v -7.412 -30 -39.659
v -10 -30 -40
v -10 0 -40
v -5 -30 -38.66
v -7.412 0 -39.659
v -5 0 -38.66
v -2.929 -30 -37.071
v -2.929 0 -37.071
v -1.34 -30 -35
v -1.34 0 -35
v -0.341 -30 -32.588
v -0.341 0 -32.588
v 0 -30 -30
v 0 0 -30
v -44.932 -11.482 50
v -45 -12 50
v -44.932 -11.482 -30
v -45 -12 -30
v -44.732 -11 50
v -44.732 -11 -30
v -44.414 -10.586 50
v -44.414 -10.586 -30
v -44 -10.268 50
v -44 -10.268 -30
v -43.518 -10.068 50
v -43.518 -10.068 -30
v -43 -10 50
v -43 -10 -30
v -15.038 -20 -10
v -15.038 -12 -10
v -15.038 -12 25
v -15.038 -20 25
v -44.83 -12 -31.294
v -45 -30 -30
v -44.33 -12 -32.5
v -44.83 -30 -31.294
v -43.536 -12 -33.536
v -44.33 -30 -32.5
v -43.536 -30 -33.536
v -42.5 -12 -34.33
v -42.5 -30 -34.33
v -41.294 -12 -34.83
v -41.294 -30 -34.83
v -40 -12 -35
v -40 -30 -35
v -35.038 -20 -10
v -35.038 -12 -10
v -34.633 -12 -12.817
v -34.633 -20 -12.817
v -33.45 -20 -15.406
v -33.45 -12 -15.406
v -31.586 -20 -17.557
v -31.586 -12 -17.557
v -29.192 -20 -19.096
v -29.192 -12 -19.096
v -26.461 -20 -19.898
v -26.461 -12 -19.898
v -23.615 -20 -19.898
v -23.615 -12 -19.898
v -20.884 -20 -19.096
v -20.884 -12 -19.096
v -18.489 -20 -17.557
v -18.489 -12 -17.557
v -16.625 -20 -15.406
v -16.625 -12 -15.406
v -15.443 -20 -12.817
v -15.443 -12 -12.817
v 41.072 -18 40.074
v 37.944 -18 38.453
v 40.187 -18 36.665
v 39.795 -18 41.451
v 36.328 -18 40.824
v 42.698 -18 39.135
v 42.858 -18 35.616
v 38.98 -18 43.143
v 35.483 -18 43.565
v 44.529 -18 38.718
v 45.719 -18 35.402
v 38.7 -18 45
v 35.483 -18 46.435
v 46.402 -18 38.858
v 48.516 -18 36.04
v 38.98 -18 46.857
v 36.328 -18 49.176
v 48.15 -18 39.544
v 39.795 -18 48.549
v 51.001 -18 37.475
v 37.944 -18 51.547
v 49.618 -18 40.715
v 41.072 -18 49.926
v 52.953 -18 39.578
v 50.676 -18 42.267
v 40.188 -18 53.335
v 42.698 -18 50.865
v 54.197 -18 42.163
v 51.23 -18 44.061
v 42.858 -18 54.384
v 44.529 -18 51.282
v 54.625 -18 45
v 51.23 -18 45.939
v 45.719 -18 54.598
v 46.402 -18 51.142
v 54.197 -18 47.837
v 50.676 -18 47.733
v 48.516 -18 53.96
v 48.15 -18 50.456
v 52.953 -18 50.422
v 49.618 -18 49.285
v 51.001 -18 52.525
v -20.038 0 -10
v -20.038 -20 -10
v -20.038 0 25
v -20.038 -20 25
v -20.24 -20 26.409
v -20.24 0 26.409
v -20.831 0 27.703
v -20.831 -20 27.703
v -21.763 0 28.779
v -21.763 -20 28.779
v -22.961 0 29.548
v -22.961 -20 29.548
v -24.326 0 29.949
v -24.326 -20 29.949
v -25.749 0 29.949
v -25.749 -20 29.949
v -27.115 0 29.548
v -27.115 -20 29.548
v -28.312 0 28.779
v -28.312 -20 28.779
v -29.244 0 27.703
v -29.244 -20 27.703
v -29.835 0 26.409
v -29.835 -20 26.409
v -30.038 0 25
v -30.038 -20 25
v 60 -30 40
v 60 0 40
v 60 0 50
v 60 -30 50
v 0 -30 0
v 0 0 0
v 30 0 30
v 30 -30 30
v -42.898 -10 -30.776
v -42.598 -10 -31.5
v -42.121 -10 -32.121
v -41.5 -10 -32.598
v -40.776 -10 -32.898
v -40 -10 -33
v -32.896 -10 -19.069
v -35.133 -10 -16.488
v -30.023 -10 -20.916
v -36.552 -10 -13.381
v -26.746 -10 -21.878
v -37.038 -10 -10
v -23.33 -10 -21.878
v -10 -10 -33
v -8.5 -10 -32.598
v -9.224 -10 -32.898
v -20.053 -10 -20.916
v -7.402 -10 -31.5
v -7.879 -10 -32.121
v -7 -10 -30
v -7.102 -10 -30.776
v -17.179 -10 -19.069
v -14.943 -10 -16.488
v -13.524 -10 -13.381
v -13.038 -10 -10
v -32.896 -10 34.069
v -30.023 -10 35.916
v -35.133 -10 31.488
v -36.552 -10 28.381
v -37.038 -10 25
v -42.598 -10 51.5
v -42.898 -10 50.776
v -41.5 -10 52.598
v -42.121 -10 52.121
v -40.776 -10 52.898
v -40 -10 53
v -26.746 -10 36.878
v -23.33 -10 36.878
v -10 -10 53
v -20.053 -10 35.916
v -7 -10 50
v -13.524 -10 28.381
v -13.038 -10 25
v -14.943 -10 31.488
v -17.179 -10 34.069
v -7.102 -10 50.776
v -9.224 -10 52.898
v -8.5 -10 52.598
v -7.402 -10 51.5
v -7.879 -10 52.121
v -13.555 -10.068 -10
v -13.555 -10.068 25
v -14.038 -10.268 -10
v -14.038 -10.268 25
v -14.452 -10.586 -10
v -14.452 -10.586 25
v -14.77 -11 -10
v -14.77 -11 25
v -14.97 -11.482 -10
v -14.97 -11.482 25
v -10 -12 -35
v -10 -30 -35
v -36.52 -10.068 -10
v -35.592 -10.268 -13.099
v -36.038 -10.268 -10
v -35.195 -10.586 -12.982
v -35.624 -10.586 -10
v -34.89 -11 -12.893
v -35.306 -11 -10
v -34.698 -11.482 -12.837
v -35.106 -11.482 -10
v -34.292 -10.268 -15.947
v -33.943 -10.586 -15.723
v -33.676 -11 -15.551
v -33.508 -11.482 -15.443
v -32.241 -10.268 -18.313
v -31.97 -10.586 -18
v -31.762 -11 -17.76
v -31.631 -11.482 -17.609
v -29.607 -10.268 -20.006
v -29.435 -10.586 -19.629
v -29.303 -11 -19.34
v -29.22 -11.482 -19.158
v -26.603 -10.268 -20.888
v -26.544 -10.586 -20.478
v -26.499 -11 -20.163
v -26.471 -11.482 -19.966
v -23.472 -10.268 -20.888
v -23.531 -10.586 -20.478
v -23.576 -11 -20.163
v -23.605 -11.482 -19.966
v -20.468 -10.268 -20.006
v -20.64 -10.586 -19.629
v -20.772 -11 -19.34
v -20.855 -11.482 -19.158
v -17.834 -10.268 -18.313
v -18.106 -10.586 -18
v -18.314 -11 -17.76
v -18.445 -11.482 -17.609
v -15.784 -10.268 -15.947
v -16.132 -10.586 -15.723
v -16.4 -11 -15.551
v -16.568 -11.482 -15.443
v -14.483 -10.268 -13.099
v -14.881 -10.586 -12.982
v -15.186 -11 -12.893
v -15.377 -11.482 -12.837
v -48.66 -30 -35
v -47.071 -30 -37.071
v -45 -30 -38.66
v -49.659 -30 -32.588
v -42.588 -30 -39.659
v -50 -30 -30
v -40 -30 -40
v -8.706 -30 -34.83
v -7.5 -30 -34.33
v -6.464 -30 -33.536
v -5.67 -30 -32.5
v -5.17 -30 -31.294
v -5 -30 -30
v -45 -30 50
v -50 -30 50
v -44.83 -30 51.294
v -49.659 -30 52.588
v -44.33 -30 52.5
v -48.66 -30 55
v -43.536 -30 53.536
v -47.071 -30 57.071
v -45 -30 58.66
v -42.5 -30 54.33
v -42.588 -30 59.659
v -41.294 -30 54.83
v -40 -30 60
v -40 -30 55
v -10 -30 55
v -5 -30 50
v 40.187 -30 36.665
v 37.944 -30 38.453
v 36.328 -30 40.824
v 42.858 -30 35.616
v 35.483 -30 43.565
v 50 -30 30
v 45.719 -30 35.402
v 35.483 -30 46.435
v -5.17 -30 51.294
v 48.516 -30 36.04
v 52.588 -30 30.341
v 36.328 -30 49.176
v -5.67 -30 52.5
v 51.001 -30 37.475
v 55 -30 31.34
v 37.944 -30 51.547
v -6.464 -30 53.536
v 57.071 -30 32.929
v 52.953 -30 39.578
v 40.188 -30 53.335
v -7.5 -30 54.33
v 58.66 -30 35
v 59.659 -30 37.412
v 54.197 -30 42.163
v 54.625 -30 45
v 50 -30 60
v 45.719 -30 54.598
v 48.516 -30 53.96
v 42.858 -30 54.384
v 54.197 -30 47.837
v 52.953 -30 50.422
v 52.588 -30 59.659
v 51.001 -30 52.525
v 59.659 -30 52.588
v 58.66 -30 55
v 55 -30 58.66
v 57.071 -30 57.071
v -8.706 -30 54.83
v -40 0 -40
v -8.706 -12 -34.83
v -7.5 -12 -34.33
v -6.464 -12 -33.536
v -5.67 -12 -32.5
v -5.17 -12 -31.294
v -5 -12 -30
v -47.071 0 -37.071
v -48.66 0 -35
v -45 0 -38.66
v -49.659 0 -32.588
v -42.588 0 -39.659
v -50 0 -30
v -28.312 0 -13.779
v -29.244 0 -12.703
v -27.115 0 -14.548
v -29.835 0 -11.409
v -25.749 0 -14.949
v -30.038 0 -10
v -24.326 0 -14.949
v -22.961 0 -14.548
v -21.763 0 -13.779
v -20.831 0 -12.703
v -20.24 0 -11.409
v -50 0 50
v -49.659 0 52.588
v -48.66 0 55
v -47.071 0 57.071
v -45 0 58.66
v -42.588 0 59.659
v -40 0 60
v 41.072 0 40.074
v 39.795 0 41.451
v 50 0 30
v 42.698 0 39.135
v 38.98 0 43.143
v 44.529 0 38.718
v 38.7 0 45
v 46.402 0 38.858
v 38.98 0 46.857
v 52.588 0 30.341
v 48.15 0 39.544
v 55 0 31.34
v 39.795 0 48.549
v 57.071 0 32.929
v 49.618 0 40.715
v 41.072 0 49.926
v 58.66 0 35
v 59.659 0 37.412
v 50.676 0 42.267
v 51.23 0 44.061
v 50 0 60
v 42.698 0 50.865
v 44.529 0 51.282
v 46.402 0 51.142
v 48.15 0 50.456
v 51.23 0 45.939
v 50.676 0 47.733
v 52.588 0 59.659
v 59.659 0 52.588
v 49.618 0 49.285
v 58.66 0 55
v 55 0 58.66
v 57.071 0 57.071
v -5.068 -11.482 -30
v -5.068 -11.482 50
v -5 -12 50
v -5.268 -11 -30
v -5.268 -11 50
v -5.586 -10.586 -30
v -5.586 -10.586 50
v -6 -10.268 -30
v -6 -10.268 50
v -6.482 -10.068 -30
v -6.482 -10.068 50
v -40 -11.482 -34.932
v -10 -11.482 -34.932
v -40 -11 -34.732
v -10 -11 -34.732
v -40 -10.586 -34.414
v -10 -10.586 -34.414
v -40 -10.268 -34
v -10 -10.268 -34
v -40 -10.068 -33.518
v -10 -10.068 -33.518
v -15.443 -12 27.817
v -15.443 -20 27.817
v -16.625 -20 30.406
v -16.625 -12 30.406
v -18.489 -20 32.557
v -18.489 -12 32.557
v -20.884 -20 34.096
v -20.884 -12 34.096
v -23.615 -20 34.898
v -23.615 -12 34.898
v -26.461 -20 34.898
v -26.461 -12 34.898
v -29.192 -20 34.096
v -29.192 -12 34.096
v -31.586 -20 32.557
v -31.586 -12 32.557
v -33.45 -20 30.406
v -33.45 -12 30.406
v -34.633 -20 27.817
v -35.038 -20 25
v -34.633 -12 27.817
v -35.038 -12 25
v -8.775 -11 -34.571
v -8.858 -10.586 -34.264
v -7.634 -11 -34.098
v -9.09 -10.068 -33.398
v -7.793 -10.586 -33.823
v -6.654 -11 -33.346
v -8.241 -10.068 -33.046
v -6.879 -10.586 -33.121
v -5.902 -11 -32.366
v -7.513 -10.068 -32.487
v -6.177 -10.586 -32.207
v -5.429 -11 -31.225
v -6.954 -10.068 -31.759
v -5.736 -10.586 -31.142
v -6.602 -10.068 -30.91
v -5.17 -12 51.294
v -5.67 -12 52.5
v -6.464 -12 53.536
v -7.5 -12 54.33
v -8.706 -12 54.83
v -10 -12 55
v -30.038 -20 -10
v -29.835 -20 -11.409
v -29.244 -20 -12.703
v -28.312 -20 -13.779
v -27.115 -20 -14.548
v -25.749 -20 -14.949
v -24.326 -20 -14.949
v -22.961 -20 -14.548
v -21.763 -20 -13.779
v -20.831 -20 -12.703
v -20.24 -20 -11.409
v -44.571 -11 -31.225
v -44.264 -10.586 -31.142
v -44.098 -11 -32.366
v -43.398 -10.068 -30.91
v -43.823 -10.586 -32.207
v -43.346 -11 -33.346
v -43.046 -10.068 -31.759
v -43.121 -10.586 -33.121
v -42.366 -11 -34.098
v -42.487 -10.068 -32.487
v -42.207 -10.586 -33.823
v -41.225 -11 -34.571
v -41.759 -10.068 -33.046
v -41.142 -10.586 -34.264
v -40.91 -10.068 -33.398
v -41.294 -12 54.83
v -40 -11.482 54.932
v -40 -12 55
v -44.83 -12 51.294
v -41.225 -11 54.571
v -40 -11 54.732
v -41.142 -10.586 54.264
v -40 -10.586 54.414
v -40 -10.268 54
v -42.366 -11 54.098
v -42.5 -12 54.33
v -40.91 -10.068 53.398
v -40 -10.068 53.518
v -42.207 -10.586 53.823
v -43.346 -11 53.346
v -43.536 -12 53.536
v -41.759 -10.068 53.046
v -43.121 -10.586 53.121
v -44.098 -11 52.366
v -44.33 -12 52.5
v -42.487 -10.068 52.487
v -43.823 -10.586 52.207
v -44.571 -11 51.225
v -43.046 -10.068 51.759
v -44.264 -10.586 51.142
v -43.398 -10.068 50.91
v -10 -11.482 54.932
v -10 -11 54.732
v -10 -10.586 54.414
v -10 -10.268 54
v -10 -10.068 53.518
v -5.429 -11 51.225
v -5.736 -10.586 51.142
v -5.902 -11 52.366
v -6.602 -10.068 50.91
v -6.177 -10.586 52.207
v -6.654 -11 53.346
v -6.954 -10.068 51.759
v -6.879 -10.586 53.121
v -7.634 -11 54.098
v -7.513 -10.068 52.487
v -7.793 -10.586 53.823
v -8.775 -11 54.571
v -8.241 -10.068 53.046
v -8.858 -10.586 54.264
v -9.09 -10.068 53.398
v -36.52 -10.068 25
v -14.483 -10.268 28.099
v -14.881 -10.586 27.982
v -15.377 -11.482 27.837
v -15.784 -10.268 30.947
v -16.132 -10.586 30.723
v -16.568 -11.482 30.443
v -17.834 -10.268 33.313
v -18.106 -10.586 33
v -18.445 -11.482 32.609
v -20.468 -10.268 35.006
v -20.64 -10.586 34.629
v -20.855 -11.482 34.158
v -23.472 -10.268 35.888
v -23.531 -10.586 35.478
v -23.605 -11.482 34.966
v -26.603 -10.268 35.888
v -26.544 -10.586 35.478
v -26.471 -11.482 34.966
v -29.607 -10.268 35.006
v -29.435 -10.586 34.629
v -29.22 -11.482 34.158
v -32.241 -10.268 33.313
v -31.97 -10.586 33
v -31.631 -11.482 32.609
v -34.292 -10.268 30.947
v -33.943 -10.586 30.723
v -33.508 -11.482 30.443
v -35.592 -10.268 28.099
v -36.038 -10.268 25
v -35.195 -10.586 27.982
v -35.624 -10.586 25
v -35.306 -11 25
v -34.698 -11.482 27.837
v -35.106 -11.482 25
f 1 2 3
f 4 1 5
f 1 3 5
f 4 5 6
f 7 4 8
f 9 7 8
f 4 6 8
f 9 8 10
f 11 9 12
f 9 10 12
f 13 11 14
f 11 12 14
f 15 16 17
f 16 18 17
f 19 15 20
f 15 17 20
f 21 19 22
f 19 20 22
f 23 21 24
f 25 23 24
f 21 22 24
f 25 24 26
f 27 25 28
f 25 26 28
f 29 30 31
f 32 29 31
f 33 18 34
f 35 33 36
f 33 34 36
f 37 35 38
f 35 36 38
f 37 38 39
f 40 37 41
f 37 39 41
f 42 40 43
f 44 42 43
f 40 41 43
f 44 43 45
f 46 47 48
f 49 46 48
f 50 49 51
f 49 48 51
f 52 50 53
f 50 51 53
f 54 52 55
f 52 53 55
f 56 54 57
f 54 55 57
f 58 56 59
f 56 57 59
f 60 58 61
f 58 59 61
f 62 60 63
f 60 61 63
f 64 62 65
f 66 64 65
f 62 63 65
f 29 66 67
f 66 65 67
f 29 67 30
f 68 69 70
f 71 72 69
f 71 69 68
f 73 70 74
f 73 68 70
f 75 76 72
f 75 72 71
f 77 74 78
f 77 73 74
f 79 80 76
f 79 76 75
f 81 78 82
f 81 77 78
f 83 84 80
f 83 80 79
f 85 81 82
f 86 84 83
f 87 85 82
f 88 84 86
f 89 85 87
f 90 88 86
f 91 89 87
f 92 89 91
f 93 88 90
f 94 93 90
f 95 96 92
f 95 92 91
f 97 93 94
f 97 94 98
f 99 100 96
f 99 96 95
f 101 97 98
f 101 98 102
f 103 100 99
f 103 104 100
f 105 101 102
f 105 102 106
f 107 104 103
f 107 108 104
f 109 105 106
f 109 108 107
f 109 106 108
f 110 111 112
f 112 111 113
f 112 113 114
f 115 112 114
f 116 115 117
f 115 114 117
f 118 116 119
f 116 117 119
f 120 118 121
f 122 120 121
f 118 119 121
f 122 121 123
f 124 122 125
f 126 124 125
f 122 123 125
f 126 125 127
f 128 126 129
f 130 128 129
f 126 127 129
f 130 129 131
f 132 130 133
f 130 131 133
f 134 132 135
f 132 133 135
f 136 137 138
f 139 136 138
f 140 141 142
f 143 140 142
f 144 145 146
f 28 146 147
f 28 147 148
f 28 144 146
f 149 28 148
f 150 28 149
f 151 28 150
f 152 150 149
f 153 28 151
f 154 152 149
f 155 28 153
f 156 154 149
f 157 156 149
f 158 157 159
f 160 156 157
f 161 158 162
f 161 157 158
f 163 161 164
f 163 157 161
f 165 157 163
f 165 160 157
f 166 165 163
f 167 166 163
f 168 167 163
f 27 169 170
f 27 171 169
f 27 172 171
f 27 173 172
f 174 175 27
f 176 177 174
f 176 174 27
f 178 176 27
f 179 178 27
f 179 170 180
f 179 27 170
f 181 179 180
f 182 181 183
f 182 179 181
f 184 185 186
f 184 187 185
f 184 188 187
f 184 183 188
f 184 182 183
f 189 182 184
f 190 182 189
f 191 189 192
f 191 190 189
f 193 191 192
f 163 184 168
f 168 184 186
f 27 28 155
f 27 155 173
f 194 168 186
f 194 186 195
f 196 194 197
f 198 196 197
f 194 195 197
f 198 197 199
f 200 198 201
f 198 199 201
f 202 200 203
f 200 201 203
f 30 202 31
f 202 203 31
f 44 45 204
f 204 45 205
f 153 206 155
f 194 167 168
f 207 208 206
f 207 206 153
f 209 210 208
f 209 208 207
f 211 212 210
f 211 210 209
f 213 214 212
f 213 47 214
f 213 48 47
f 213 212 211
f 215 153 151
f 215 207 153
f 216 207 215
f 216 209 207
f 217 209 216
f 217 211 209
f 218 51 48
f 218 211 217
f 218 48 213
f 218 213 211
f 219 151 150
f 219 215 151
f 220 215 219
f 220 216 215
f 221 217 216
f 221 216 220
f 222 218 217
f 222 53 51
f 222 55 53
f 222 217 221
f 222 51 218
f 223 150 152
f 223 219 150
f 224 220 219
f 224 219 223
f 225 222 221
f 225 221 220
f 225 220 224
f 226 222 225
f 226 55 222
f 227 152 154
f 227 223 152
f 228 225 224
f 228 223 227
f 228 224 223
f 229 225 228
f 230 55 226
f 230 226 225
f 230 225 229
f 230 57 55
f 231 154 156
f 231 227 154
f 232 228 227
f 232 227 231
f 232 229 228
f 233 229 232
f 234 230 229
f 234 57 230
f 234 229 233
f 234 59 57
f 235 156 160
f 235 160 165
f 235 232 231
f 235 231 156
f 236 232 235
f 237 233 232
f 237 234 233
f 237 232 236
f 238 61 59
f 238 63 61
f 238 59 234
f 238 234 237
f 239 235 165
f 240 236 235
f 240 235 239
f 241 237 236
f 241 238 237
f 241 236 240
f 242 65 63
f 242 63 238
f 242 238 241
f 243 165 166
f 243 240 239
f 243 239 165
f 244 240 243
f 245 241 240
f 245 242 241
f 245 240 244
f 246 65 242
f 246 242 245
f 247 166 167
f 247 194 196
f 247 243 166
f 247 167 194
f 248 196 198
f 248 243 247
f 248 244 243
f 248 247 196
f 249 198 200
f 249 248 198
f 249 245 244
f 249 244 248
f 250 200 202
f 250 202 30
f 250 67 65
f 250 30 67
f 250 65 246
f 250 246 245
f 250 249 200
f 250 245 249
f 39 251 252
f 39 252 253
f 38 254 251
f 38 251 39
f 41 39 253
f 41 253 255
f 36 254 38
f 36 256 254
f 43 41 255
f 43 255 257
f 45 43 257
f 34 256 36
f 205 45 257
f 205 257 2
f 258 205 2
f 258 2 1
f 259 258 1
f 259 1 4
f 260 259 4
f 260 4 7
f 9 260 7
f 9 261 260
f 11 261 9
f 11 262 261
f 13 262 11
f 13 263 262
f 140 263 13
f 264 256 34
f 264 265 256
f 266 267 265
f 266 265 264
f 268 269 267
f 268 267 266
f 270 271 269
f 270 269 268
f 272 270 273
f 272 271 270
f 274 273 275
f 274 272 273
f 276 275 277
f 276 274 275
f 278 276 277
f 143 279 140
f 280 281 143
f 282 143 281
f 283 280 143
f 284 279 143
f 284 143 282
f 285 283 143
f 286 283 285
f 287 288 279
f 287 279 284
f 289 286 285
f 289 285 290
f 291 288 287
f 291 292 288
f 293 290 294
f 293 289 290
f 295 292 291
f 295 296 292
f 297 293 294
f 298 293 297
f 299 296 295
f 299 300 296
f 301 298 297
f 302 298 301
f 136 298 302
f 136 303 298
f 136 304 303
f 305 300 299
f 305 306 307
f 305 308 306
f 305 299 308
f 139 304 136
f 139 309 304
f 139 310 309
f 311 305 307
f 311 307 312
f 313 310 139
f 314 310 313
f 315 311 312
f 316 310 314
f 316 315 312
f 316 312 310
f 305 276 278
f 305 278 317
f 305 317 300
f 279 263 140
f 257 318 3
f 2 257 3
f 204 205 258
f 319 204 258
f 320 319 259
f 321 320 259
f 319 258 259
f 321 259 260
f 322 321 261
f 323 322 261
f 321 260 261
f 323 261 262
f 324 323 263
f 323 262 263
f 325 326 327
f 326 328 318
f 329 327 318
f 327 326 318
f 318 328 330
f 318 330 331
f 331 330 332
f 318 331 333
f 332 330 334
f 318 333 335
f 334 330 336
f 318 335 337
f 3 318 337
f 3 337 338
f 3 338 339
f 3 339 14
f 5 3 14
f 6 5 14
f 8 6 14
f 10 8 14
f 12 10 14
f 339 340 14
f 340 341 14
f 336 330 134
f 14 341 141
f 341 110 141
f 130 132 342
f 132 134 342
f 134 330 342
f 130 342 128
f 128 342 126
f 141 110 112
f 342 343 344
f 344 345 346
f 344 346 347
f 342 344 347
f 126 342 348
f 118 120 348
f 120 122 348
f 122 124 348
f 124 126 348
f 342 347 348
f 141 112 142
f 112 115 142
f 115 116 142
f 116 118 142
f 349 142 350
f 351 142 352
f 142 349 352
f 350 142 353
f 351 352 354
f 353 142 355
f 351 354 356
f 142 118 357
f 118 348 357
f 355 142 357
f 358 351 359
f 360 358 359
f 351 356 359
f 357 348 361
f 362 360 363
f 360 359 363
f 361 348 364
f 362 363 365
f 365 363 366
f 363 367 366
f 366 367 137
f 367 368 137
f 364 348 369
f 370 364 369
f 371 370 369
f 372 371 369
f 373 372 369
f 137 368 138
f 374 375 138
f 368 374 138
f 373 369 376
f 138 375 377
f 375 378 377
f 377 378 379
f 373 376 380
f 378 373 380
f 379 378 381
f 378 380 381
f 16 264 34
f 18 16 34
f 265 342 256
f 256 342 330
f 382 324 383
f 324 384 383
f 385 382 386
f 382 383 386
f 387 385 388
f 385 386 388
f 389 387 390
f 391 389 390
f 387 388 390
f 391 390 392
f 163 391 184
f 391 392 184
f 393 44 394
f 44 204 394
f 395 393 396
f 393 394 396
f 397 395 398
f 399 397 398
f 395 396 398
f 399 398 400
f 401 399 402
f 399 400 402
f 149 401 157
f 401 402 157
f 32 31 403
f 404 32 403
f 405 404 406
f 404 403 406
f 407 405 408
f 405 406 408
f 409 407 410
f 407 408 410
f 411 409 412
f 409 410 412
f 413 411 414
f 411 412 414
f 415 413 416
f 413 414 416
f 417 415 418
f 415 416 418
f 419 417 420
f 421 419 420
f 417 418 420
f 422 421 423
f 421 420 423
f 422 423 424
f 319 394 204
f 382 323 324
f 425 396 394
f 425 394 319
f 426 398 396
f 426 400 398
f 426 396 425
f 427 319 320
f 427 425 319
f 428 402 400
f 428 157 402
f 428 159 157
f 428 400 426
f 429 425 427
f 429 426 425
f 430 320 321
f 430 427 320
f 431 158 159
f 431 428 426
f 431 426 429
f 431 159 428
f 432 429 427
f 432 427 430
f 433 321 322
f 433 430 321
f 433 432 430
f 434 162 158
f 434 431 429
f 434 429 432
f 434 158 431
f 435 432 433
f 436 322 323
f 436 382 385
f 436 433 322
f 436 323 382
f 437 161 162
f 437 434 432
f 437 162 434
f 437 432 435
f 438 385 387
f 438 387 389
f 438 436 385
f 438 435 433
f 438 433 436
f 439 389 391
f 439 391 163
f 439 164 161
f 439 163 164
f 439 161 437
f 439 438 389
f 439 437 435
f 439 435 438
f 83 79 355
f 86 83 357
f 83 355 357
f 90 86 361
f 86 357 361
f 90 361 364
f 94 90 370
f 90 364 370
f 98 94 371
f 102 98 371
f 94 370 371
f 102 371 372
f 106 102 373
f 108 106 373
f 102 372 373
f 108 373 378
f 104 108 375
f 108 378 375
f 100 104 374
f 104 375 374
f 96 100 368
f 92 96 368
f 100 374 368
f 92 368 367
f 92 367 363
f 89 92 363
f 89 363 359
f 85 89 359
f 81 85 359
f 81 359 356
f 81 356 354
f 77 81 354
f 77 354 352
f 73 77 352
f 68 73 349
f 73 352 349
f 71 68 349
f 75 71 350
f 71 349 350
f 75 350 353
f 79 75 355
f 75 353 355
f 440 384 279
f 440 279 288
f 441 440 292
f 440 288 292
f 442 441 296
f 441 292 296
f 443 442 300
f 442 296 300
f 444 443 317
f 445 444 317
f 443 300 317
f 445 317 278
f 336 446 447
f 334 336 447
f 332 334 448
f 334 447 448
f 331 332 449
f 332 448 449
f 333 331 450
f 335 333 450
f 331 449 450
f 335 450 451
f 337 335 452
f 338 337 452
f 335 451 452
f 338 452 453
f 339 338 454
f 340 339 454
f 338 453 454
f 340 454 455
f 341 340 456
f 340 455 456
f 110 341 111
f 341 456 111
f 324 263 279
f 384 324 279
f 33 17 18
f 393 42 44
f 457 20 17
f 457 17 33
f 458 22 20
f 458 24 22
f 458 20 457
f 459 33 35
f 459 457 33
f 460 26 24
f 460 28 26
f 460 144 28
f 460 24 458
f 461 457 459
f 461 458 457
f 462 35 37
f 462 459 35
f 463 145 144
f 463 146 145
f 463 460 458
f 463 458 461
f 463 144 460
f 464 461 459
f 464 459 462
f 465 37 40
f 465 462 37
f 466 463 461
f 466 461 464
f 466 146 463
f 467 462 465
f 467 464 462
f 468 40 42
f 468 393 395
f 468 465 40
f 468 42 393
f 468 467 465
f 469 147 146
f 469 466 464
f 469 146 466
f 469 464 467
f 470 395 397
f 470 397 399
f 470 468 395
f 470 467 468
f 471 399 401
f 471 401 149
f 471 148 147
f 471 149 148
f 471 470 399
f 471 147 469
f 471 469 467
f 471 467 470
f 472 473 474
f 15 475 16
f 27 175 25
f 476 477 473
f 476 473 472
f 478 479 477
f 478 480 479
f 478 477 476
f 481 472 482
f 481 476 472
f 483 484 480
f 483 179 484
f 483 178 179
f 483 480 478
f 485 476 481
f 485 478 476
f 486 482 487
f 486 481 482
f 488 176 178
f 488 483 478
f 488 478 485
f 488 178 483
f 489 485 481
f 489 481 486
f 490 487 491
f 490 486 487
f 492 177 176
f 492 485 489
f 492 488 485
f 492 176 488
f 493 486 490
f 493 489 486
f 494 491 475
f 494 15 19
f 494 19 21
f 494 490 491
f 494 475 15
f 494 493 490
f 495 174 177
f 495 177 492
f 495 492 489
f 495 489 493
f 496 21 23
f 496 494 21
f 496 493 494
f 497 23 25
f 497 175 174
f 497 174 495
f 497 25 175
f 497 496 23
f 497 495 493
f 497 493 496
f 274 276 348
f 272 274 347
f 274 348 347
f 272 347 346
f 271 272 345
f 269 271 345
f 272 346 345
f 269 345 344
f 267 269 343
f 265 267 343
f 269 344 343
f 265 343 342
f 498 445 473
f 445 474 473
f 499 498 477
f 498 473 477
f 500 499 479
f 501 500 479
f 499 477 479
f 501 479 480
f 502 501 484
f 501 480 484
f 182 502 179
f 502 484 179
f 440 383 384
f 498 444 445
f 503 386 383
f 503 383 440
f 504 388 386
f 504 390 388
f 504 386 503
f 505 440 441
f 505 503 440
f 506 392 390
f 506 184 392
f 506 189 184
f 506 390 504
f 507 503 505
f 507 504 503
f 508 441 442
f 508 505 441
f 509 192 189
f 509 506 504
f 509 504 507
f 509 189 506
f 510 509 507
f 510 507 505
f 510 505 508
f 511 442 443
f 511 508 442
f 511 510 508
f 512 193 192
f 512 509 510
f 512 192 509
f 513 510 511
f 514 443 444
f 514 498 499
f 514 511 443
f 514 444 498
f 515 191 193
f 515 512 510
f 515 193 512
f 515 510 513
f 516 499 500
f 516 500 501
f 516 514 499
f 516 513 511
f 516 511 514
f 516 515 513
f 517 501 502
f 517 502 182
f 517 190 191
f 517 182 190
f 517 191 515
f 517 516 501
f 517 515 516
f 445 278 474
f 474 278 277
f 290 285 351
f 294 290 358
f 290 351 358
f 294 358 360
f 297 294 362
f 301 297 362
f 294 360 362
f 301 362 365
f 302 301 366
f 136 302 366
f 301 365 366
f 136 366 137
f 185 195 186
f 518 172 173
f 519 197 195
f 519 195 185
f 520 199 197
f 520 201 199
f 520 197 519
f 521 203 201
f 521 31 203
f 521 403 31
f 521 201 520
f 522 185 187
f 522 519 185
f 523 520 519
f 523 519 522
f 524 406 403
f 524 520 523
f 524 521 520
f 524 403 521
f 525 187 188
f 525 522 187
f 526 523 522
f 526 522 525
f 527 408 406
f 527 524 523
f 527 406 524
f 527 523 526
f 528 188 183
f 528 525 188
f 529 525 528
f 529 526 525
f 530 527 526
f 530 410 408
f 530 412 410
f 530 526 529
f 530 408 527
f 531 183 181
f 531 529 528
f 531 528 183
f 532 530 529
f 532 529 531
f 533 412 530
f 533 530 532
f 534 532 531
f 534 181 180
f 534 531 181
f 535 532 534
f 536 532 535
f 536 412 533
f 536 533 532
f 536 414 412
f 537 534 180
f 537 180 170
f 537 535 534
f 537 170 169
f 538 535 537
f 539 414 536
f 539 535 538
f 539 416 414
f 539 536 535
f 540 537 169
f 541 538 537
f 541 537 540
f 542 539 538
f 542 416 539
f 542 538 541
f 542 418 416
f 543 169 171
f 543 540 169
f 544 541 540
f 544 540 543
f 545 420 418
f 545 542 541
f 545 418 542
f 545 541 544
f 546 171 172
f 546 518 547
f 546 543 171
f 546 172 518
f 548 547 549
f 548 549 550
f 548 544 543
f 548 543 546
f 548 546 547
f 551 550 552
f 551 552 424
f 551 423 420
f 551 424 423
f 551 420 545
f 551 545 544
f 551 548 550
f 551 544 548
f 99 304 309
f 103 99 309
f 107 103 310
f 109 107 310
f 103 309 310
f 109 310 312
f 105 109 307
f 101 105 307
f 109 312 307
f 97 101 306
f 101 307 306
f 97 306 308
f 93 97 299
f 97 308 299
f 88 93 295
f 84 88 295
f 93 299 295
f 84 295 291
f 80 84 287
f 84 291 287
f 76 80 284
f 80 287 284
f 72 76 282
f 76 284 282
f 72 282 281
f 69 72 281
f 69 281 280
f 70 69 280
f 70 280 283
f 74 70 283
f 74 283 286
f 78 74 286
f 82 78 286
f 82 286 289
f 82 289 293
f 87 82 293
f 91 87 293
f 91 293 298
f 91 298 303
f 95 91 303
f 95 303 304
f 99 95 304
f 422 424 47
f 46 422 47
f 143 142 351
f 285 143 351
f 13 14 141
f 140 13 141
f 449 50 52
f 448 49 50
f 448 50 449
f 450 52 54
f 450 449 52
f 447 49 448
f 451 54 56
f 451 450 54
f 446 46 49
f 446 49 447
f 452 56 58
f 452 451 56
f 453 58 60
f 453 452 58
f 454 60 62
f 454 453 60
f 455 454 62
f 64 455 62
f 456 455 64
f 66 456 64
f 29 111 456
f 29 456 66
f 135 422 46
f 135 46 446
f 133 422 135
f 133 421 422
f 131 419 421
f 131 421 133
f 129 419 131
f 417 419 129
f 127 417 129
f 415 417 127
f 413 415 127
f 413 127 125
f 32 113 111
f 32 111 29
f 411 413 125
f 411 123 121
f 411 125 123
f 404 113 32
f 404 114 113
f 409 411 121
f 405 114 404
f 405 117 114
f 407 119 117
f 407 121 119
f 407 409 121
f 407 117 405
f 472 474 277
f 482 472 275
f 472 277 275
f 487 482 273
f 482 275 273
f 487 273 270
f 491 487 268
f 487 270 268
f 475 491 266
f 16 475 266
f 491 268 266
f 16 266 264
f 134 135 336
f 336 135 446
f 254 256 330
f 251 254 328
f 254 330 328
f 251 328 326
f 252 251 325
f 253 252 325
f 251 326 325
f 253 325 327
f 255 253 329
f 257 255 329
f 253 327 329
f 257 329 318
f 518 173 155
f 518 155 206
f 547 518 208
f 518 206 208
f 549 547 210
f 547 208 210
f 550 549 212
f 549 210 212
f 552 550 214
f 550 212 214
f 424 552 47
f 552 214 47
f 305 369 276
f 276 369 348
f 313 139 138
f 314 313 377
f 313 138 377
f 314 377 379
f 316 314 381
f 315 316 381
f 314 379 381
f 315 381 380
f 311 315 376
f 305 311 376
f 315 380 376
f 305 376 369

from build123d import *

# Parameters (mm, degrees)
F1_DEPTH       = 30
F3_D           = 12.6
F3_CBORE_D     = 19.25
F3_CBORE_DEPTH = 12
F5_DEPTH       = 20
F7_DEPTH       = 10
F9_DEPTH       = 51.5
F10_R          = 2


with BuildPart() as f1:
    # F0 (on Front) → F1 (new body)
    with BuildSketch(Plane.XZ):
        with BuildLine():
            Line((0, -30), (0, 0))
            Line((0, 0), (30, 30))
            Line((30, 30), (50, 30))
            ThreePointArc((50, 30), (57.0710678119, 32.9289321881), (60, 40))
            Line((60, 40), (60, 50))
            ThreePointArc((60, 50), (57.0710678119, 57.0710678119), (50, 60))
            Line((50, 60), (-40, 60))
            ThreePointArc((-40, 60), (-47.0710678119, 57.0710678119), (-50, 50))
            Line((-50, 50), (-50, -30))
            ThreePointArc((-50, -30), (-47.0710678119, -37.0710678119), (-40, -40))
            Line((-40, -40), (-10, -40))
            ThreePointArc((-10, -40), (-2.9289321881, -37.0710678119), (0, -30))
        make_face()
    extrude(amount=F1_DEPTH)

    # F3 (through all)
    with Locations(Plane.XZ.offset(30)):
        with Locations((45, 45)):
            CounterBoreHole(F3_D / 2, F3_CBORE_D / 2, F3_CBORE_DEPTH)

    # F4 (on face) → F5 (cut)
    with BuildSketch(Plane.XZ.offset(30)):
        with BuildLine():
            Line((-5.0000011261, -30), (-5.0000011261, 0))
            Line((-5.0000011261, 0), (-5.0000011261, 50))
            ThreePointArc((-5.0000011261, 50), (-6.4644668903, 53.5355331097), (-10, 54.9999988739))
            Line((-10, 54.9999988739), (-40, 54.9999988739))
            ThreePointArc((-40, 54.9999988739), (-43.5355331097, 53.5355331097), (-44.9999988739, 50))
            Line((-44.9999988739, 50), (-44.9999988739, -30))
            ThreePointArc((-44.9999988739, -30), (-43.5355331097, -33.5355331097), (-40, -34.9999988739))
            Line((-40, -34.9999988739), (-10, -34.9999988739))
            ThreePointArc((-10, -34.9999988739), (-6.4644668903, -33.5355331097), (-5.0000011261, -30))
        make_face()
    extrude(amount=-F5_DEPTH, mode=Mode.SUBTRACT)

    # F6 (on face) → F7 (join)
    with BuildSketch(Plane.XZ.offset(10)):
        with BuildLine():
            ThreePointArc((-35.0377668691, -10), (-25.0377668691, -20), (-15.0377668691, -10))
            Line((-15.0377668691, -10), (-15.0377668691, 25))
            ThreePointArc((-15.0377668691, 25), (-25.0377668691, 35), (-35.0377668691, 25))
            Line((-35.0377668691, 25), (-35.0377668691, -10))
        make_face()
    extrude(amount=F7_DEPTH)

    # F8 (on face) → F9 (cut, symmetric)
    with BuildSketch(Plane.XZ.offset(20)):
        with BuildLine():
            ThreePointArc((-30.0377668691, -10), (-25.0377668691, -15), (-20.0377668691, -10))
            Line((-20.0377668691, -10), (-20.0377668691, 25))
            ThreePointArc((-20.0377668691, 25), (-25.0377668691, 30), (-30.0377668691, 25))
            Line((-30.0377668691, 25), (-30.0377668691, -10))
        make_face()
    extrude(amount=F9_DEPTH, both=True, mode=Mode.SUBTRACT)

    # F10
    f10_edges = [f1.edges().sort_by_distance(p)[0] for p in [
        (-5.000001, -10, 10),
        (-6.464467, -10, -33.535533),
        (-6.464467, -10, 53.535533),
        (-25, -10, -34.999999),
        (-25, -10, 54.999999),
        (-43.535533, -10, -33.535533),
        (-43.535533, -10, 53.535533),
        (-44.999999, -10, 10),
        (-35.037767, -10, 7.5),
        (-25.037767, -10, -20),
        (-15.037767, -10, 7.5),
        (-25.037767, -10, 35),
    ]]
    fillet(f10_edges, radius=F10_R)


solid = f1.part
